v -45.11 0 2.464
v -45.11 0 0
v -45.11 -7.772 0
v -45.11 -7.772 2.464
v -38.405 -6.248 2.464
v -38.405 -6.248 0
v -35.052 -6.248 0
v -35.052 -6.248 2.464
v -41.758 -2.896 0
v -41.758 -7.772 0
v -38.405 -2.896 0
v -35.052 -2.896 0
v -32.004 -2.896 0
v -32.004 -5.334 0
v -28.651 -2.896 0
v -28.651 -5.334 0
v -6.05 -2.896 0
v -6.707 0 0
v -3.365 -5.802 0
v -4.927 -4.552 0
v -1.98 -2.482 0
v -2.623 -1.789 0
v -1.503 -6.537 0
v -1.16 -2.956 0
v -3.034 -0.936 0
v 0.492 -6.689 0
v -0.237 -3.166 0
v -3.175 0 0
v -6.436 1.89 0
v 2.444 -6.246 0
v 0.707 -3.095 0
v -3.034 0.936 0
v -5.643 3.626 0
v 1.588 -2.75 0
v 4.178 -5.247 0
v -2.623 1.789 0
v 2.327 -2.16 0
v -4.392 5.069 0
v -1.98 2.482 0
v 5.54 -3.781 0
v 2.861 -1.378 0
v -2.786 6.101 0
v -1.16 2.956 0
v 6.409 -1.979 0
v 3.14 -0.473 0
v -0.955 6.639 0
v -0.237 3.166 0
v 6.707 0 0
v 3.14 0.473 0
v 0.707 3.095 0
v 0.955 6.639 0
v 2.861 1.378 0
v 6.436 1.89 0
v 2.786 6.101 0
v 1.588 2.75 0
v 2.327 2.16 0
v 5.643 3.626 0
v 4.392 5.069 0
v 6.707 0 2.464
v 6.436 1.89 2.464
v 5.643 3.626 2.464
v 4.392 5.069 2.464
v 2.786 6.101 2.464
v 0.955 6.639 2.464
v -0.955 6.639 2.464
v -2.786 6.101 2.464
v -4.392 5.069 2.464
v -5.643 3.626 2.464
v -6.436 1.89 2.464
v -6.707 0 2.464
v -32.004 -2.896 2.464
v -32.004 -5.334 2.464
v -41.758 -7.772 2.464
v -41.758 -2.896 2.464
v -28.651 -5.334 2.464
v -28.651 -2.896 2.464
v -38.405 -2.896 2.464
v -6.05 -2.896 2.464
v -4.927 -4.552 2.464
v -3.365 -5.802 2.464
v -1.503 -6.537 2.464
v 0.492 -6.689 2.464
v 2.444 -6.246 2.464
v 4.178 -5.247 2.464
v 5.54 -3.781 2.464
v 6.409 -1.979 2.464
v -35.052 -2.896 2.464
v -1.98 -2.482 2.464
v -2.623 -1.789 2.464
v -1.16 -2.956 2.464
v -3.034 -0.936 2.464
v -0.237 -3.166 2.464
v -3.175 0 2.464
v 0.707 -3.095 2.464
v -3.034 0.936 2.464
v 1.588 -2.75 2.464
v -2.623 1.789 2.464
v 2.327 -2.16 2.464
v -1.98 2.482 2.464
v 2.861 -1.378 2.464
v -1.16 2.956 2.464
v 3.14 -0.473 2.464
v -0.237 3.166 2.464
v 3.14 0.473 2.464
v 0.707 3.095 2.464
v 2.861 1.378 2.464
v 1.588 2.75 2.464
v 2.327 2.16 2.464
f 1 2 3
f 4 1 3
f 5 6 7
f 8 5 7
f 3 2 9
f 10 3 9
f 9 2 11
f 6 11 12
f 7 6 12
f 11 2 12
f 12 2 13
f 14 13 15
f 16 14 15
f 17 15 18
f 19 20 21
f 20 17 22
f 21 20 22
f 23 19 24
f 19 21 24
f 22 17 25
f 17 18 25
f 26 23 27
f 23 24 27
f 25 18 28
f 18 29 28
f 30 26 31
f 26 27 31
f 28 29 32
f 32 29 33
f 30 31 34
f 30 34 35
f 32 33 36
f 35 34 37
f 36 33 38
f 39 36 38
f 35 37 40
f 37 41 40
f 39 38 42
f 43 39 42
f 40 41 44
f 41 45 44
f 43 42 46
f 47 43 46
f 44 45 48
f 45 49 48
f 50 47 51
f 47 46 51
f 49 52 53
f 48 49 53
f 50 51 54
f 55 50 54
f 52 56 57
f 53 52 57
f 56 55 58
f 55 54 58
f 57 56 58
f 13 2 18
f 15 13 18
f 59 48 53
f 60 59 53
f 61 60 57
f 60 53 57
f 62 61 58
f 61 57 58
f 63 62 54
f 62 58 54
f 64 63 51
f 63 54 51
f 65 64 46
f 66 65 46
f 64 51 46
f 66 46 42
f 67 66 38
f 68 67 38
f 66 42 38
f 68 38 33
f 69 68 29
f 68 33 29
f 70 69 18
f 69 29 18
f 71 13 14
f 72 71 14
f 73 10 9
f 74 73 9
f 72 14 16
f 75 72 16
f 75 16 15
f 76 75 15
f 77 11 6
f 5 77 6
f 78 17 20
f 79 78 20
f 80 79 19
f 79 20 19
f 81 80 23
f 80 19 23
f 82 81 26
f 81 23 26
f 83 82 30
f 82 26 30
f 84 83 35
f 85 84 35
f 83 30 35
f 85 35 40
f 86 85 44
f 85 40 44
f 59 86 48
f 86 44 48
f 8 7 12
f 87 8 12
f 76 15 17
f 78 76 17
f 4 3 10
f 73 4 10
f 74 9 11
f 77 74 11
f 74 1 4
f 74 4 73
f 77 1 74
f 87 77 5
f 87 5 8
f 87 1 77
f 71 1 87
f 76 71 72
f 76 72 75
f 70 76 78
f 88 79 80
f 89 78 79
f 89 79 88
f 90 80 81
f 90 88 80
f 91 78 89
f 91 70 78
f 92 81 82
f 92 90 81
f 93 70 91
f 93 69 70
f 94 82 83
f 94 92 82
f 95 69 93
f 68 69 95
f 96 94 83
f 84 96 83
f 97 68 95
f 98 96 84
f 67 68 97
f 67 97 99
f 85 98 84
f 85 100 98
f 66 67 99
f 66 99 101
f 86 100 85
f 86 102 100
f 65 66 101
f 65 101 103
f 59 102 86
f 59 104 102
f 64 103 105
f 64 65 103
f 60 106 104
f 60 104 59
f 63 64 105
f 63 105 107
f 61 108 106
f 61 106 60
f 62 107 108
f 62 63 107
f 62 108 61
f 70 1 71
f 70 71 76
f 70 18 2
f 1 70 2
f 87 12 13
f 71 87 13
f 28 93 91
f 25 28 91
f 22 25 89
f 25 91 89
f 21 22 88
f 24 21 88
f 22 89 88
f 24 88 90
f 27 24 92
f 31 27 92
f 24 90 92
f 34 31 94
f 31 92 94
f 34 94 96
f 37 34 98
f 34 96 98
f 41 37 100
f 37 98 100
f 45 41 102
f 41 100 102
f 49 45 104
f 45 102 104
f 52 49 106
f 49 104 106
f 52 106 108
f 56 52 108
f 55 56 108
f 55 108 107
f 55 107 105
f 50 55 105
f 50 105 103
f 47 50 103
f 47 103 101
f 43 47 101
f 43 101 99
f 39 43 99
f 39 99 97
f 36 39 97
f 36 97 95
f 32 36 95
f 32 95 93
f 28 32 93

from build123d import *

# Parameters (mm, degrees)
F1_DEPTH = 2.46395
F2_D     = 6.35


with BuildPart() as f1:
    # F0 (on Top) → F1 (new body)
    with BuildSketch(Plane.XY):
        with BuildLine():
            ThreePointArc((-6.05011, -2.8956), (1.484625, -6.540965), (6.707334, 0))
            ThreePointArc((6.707334, 0), (0, 6.707334), (-6.707334, 0))
            ThreePointArc((-6.707334, 0), (-6.540965, -1.484625), (-6.05011, -2.8956))
        make_face()
        with BuildLine():
            ThreePointArc((-6.05011, -2.8956), (-6.540965, -1.484625), (-6.707334, 0))
            Line((-6.707334, 0), (-45.110401, 0))
            Line((-45.110401, 0), (-45.110401, -7.772401))
            Line((-45.110401, -7.772401), (-41.757599, -7.772401))
            Line((-41.757599, -7.772401), (-41.757599, -2.8956))
            Line((-41.757599, -2.8956), (-38.4048, -2.8956))
            Line((-38.4048, -2.8956), (-38.4048, -6.2484))
            Line((-38.4048, -6.2484), (-35.052001, -6.2484))
            Line((-35.052001, -6.2484), (-35.052001, -2.8956))
            Line((-35.052001, -2.8956), (-32.003999, -2.8956))
            Line((-32.003999, -2.8956), (-32.003999, -5.334001))
            Line((-32.003999, -5.334001), (-28.651198, -5.334001))
            Line((-28.651198, -5.334001), (-28.651198, -2.8956))
            Line((-28.651198, -2.8956), (-6.05011, -2.8956))
        make_face()
    extrude(amount=F1_DEPTH)

    # F2 (through all)
    with Locations(Plane(origin=(0, 0, 0), x_dir=(1, 0, 0), z_dir=(0, 0, -1))):
        with Locations((0, 0)):
            Hole(F2_D / 2)


solid = f1.part
